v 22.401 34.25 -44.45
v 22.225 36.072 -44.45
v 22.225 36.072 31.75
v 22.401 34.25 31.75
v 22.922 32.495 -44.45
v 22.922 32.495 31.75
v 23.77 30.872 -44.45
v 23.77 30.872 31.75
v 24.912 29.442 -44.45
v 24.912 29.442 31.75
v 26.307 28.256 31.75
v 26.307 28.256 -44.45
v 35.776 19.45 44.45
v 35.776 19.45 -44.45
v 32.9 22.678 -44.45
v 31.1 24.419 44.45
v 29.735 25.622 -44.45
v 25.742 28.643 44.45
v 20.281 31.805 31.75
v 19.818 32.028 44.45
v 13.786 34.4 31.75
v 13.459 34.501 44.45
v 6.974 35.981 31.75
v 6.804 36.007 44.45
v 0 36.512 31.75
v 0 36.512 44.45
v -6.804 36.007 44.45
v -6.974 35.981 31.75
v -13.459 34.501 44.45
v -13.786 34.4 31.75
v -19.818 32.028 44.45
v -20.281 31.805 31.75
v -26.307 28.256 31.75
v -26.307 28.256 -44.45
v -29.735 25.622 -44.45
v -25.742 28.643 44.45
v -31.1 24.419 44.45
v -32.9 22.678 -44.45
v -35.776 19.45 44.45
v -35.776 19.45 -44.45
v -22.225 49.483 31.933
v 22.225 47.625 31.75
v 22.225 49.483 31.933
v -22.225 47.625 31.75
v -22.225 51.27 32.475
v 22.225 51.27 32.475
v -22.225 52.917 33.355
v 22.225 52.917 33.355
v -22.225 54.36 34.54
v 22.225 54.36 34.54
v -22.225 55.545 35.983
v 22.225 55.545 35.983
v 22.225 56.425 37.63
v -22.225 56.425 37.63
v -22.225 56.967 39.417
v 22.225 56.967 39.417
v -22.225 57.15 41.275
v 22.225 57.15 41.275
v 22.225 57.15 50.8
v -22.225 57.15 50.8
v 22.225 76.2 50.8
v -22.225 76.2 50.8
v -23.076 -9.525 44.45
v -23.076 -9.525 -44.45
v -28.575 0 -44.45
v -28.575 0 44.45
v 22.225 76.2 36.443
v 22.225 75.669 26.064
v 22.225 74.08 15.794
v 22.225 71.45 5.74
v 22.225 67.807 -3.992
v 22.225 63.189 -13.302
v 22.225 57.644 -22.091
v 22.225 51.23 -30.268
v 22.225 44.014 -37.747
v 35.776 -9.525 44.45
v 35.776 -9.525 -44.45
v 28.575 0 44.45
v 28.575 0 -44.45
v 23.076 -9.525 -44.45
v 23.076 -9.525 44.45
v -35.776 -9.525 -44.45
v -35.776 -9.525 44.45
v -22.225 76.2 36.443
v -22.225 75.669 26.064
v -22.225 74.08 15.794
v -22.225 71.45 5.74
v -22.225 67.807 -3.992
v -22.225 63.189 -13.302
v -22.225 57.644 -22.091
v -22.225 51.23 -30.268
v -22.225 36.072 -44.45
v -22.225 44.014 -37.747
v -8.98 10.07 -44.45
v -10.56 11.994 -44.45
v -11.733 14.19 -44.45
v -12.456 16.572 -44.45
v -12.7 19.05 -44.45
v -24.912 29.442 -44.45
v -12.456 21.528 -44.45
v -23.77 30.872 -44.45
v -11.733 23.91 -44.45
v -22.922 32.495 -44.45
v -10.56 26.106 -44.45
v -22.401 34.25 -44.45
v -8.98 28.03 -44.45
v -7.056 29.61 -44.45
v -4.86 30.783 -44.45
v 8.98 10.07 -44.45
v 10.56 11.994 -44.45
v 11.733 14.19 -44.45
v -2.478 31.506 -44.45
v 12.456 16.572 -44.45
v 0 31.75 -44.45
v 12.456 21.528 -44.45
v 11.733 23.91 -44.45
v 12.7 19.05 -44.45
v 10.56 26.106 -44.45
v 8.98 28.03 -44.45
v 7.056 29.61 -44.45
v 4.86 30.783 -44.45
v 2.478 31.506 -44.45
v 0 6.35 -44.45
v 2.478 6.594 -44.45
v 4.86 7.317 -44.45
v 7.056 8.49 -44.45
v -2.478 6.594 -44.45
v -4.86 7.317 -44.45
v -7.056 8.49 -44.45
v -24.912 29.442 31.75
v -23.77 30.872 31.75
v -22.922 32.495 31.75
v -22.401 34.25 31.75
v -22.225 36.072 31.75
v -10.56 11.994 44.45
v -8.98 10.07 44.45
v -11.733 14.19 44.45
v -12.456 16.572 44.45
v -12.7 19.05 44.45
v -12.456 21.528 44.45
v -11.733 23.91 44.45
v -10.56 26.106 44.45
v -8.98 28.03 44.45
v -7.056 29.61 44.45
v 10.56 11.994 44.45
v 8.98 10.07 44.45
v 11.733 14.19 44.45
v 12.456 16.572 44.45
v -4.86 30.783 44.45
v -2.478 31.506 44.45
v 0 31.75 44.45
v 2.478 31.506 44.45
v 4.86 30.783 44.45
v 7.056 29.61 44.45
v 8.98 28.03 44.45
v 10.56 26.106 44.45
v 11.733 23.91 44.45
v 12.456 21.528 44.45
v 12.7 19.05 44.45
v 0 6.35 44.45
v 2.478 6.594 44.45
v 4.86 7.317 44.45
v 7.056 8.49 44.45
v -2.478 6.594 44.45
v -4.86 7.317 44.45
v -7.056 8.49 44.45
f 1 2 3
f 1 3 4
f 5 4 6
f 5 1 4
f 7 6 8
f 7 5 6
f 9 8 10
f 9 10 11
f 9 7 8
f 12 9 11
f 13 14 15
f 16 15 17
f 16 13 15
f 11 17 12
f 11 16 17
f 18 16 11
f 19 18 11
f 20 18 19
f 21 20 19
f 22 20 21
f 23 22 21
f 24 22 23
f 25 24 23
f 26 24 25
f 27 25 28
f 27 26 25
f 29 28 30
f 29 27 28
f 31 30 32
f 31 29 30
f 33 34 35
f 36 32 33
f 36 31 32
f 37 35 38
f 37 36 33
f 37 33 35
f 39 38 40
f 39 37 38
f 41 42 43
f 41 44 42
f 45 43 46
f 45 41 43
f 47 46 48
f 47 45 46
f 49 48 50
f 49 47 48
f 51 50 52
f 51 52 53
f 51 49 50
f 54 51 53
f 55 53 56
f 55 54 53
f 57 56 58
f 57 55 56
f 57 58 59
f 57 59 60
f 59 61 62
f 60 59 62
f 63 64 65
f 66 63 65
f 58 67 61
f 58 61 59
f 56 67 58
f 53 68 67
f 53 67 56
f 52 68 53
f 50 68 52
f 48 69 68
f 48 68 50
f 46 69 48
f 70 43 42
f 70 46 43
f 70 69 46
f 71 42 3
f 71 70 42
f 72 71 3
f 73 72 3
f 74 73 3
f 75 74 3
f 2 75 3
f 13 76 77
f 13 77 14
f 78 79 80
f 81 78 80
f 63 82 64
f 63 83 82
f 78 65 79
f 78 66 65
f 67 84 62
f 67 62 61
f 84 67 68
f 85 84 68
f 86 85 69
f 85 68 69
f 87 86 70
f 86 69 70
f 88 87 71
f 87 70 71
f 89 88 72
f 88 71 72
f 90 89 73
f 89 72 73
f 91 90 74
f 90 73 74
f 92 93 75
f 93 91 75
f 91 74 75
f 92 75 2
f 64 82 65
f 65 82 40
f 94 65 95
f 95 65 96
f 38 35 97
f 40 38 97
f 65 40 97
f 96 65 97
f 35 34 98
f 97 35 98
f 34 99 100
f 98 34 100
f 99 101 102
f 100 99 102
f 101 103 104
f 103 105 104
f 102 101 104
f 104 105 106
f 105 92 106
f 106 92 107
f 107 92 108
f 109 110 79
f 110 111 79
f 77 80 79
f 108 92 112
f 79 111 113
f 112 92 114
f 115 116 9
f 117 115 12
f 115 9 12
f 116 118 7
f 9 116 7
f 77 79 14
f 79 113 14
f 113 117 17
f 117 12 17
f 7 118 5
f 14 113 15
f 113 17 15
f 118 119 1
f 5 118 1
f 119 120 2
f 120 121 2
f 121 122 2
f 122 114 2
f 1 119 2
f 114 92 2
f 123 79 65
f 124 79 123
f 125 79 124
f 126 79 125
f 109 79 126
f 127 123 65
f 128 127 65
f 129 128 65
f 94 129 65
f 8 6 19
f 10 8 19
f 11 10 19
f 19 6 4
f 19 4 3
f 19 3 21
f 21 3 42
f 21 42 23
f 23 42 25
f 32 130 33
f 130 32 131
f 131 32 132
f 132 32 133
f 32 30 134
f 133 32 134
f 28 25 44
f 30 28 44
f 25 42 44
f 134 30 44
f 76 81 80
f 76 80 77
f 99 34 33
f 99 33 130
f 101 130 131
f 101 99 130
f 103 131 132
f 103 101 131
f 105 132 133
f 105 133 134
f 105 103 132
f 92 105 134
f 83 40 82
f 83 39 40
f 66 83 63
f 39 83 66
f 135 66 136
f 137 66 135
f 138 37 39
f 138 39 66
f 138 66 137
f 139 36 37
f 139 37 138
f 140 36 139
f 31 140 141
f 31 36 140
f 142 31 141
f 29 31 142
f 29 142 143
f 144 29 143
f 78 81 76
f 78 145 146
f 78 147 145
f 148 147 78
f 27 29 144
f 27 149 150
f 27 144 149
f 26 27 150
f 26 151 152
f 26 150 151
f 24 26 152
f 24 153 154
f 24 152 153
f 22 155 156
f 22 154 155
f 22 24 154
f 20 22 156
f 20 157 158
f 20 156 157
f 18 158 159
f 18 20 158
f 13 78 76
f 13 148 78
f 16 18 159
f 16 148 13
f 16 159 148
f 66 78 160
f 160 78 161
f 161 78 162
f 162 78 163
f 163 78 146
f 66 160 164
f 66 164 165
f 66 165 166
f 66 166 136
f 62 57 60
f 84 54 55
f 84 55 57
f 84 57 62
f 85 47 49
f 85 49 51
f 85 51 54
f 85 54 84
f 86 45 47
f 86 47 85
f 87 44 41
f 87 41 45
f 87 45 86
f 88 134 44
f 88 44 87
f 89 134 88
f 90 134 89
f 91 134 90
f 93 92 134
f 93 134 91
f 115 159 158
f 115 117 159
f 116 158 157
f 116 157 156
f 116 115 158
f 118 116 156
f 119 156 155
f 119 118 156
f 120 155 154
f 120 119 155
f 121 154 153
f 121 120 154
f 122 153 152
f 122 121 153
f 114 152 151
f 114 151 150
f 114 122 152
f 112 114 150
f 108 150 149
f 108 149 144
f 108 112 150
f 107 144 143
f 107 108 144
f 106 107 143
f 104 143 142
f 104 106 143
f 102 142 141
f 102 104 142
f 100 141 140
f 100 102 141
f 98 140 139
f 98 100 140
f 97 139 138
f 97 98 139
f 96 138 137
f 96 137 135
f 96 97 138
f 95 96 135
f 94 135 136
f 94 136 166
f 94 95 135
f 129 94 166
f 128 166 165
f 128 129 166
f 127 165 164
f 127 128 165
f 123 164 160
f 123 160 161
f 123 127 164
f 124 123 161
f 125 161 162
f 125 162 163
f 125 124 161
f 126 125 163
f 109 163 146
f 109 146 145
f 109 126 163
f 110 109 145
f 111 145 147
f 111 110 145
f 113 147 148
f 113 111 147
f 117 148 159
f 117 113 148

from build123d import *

# Parameters (mm, degrees)
SKETCH2_R           = 12.7
BOSS_EXTRUDE1_DEPTH = 44.45
BOSS_EXTRUDE3_START = -76.2
BOSS_EXTRUDE3_DEPTH = 76.2
SKETCH5_3_W         = 44.45
SKETCH5_3_H         = 19.05
BOSS_EXTRUDE4_DEPTH = 95.25
CUT_EXTRUDE2_DEPTH  = 109.402793728
FILLET1_R           = 9.525


with BuildPart() as part:
    # Sketch2 → Boss-Extrude1 (new, symmetric)
    with BuildSketch(Plane.XY):
        with BuildLine():
            Line((-28.575, 0), (28.575, 0))
            Line((28.575, 0), (23.075738686, -9.525))
            Line((23.075738686, -9.525), (28.575, -9.525))
            Line((28.575, -9.525), (35.775738686, -9.525))
            Line((35.775738686, -9.525), (35.775738686, 19.449953455))
            ThreePointArc((35.775738686, 19.449953455), (0, 36.5125), (-35.775738686, 19.449953455))
            Line((-35.775738686, 19.449953455), (-35.775738686, -9.525))
            Line((-35.775738686, -9.525), (-28.575, -9.525))
            Line((-28.575, -9.525), (-23.075738686, -9.525))
            Line((-23.075738686, -9.525), (-28.575, 0))
        make_face()
        with Locations((0, 19.05)):
            Circle(SKETCH2_R, mode=Mode.SUBTRACT)
    extrude(amount=BOSS_EXTRUDE1_DEPTH, both=True)

    # Sketch5 → Boss-Extrude3 (add)
    with BuildSketch(Plane(origin=(0, 0, -44.45), x_dir=(-1, 0, 0), z_dir=(0, 0, -1)).offset(BOSS_EXTRUDE3_START)):
        with BuildLine():
            ThreePointArc((26.307142857, 28.255757549), (23.306989894, 31.663247782), (22.225, 36.072466007))
            Line((22.225, 36.072466007), (22.225, 76.2))
            Line((22.225, 76.2), (-22.225, 76.2))
            Line((-22.225, 76.2), (-22.225, 36.072466007))
            ThreePointArc((-22.225, 36.072466007), (-23.306989894, 31.663247782), (-26.307142857, 28.255757549))
            ThreePointArc((-26.307142857, 28.255757549), (0, 36.5125), (26.307142857, 28.255757549))
        make_face()
    extrude(amount=BOSS_EXTRUDE3_DEPTH)

    # Sketch5<3> → Boss-Extrude4 (add)
    with BuildSketch(Plane(origin=(0, 0, -44.45), x_dir=(-1, 0, 0), z_dir=(0, 0, -1))):
        with Locations((0, 66.675)):
            Rectangle(SKETCH5_3_W, SKETCH5_3_H)
    extrude(amount=-BOSS_EXTRUDE4_DEPTH)

    # Sketch6 → Cut-Extrude2 (cut, through all)
    with BuildSketch(Plane(origin=(22.225, 0, 0), x_dir=(0, 0, -1), z_dir=(1, 0, 0))):
        with BuildLine():
            Line((44.45, 76.2), (-36.443114188, 76.2))
            ThreePointArc((-36.443114188, 76.2), (8.706401057, 65.616928498), (44.45, 36.072466007))
            Line((44.45, 36.072466007), (44.45, 76.2))
        make_face()
    extrude(amount=-CUT_EXTRUDE2_DEPTH, mode=Mode.SUBTRACT)

    # Fillet1
    fillet1_edges = [part.edges().sort_by_distance(p)[0] for p in [
        (0, 57.15, 31.75),
    ]]
    fillet(fillet1_edges, radius=FILLET1_R)


solid = part.part
